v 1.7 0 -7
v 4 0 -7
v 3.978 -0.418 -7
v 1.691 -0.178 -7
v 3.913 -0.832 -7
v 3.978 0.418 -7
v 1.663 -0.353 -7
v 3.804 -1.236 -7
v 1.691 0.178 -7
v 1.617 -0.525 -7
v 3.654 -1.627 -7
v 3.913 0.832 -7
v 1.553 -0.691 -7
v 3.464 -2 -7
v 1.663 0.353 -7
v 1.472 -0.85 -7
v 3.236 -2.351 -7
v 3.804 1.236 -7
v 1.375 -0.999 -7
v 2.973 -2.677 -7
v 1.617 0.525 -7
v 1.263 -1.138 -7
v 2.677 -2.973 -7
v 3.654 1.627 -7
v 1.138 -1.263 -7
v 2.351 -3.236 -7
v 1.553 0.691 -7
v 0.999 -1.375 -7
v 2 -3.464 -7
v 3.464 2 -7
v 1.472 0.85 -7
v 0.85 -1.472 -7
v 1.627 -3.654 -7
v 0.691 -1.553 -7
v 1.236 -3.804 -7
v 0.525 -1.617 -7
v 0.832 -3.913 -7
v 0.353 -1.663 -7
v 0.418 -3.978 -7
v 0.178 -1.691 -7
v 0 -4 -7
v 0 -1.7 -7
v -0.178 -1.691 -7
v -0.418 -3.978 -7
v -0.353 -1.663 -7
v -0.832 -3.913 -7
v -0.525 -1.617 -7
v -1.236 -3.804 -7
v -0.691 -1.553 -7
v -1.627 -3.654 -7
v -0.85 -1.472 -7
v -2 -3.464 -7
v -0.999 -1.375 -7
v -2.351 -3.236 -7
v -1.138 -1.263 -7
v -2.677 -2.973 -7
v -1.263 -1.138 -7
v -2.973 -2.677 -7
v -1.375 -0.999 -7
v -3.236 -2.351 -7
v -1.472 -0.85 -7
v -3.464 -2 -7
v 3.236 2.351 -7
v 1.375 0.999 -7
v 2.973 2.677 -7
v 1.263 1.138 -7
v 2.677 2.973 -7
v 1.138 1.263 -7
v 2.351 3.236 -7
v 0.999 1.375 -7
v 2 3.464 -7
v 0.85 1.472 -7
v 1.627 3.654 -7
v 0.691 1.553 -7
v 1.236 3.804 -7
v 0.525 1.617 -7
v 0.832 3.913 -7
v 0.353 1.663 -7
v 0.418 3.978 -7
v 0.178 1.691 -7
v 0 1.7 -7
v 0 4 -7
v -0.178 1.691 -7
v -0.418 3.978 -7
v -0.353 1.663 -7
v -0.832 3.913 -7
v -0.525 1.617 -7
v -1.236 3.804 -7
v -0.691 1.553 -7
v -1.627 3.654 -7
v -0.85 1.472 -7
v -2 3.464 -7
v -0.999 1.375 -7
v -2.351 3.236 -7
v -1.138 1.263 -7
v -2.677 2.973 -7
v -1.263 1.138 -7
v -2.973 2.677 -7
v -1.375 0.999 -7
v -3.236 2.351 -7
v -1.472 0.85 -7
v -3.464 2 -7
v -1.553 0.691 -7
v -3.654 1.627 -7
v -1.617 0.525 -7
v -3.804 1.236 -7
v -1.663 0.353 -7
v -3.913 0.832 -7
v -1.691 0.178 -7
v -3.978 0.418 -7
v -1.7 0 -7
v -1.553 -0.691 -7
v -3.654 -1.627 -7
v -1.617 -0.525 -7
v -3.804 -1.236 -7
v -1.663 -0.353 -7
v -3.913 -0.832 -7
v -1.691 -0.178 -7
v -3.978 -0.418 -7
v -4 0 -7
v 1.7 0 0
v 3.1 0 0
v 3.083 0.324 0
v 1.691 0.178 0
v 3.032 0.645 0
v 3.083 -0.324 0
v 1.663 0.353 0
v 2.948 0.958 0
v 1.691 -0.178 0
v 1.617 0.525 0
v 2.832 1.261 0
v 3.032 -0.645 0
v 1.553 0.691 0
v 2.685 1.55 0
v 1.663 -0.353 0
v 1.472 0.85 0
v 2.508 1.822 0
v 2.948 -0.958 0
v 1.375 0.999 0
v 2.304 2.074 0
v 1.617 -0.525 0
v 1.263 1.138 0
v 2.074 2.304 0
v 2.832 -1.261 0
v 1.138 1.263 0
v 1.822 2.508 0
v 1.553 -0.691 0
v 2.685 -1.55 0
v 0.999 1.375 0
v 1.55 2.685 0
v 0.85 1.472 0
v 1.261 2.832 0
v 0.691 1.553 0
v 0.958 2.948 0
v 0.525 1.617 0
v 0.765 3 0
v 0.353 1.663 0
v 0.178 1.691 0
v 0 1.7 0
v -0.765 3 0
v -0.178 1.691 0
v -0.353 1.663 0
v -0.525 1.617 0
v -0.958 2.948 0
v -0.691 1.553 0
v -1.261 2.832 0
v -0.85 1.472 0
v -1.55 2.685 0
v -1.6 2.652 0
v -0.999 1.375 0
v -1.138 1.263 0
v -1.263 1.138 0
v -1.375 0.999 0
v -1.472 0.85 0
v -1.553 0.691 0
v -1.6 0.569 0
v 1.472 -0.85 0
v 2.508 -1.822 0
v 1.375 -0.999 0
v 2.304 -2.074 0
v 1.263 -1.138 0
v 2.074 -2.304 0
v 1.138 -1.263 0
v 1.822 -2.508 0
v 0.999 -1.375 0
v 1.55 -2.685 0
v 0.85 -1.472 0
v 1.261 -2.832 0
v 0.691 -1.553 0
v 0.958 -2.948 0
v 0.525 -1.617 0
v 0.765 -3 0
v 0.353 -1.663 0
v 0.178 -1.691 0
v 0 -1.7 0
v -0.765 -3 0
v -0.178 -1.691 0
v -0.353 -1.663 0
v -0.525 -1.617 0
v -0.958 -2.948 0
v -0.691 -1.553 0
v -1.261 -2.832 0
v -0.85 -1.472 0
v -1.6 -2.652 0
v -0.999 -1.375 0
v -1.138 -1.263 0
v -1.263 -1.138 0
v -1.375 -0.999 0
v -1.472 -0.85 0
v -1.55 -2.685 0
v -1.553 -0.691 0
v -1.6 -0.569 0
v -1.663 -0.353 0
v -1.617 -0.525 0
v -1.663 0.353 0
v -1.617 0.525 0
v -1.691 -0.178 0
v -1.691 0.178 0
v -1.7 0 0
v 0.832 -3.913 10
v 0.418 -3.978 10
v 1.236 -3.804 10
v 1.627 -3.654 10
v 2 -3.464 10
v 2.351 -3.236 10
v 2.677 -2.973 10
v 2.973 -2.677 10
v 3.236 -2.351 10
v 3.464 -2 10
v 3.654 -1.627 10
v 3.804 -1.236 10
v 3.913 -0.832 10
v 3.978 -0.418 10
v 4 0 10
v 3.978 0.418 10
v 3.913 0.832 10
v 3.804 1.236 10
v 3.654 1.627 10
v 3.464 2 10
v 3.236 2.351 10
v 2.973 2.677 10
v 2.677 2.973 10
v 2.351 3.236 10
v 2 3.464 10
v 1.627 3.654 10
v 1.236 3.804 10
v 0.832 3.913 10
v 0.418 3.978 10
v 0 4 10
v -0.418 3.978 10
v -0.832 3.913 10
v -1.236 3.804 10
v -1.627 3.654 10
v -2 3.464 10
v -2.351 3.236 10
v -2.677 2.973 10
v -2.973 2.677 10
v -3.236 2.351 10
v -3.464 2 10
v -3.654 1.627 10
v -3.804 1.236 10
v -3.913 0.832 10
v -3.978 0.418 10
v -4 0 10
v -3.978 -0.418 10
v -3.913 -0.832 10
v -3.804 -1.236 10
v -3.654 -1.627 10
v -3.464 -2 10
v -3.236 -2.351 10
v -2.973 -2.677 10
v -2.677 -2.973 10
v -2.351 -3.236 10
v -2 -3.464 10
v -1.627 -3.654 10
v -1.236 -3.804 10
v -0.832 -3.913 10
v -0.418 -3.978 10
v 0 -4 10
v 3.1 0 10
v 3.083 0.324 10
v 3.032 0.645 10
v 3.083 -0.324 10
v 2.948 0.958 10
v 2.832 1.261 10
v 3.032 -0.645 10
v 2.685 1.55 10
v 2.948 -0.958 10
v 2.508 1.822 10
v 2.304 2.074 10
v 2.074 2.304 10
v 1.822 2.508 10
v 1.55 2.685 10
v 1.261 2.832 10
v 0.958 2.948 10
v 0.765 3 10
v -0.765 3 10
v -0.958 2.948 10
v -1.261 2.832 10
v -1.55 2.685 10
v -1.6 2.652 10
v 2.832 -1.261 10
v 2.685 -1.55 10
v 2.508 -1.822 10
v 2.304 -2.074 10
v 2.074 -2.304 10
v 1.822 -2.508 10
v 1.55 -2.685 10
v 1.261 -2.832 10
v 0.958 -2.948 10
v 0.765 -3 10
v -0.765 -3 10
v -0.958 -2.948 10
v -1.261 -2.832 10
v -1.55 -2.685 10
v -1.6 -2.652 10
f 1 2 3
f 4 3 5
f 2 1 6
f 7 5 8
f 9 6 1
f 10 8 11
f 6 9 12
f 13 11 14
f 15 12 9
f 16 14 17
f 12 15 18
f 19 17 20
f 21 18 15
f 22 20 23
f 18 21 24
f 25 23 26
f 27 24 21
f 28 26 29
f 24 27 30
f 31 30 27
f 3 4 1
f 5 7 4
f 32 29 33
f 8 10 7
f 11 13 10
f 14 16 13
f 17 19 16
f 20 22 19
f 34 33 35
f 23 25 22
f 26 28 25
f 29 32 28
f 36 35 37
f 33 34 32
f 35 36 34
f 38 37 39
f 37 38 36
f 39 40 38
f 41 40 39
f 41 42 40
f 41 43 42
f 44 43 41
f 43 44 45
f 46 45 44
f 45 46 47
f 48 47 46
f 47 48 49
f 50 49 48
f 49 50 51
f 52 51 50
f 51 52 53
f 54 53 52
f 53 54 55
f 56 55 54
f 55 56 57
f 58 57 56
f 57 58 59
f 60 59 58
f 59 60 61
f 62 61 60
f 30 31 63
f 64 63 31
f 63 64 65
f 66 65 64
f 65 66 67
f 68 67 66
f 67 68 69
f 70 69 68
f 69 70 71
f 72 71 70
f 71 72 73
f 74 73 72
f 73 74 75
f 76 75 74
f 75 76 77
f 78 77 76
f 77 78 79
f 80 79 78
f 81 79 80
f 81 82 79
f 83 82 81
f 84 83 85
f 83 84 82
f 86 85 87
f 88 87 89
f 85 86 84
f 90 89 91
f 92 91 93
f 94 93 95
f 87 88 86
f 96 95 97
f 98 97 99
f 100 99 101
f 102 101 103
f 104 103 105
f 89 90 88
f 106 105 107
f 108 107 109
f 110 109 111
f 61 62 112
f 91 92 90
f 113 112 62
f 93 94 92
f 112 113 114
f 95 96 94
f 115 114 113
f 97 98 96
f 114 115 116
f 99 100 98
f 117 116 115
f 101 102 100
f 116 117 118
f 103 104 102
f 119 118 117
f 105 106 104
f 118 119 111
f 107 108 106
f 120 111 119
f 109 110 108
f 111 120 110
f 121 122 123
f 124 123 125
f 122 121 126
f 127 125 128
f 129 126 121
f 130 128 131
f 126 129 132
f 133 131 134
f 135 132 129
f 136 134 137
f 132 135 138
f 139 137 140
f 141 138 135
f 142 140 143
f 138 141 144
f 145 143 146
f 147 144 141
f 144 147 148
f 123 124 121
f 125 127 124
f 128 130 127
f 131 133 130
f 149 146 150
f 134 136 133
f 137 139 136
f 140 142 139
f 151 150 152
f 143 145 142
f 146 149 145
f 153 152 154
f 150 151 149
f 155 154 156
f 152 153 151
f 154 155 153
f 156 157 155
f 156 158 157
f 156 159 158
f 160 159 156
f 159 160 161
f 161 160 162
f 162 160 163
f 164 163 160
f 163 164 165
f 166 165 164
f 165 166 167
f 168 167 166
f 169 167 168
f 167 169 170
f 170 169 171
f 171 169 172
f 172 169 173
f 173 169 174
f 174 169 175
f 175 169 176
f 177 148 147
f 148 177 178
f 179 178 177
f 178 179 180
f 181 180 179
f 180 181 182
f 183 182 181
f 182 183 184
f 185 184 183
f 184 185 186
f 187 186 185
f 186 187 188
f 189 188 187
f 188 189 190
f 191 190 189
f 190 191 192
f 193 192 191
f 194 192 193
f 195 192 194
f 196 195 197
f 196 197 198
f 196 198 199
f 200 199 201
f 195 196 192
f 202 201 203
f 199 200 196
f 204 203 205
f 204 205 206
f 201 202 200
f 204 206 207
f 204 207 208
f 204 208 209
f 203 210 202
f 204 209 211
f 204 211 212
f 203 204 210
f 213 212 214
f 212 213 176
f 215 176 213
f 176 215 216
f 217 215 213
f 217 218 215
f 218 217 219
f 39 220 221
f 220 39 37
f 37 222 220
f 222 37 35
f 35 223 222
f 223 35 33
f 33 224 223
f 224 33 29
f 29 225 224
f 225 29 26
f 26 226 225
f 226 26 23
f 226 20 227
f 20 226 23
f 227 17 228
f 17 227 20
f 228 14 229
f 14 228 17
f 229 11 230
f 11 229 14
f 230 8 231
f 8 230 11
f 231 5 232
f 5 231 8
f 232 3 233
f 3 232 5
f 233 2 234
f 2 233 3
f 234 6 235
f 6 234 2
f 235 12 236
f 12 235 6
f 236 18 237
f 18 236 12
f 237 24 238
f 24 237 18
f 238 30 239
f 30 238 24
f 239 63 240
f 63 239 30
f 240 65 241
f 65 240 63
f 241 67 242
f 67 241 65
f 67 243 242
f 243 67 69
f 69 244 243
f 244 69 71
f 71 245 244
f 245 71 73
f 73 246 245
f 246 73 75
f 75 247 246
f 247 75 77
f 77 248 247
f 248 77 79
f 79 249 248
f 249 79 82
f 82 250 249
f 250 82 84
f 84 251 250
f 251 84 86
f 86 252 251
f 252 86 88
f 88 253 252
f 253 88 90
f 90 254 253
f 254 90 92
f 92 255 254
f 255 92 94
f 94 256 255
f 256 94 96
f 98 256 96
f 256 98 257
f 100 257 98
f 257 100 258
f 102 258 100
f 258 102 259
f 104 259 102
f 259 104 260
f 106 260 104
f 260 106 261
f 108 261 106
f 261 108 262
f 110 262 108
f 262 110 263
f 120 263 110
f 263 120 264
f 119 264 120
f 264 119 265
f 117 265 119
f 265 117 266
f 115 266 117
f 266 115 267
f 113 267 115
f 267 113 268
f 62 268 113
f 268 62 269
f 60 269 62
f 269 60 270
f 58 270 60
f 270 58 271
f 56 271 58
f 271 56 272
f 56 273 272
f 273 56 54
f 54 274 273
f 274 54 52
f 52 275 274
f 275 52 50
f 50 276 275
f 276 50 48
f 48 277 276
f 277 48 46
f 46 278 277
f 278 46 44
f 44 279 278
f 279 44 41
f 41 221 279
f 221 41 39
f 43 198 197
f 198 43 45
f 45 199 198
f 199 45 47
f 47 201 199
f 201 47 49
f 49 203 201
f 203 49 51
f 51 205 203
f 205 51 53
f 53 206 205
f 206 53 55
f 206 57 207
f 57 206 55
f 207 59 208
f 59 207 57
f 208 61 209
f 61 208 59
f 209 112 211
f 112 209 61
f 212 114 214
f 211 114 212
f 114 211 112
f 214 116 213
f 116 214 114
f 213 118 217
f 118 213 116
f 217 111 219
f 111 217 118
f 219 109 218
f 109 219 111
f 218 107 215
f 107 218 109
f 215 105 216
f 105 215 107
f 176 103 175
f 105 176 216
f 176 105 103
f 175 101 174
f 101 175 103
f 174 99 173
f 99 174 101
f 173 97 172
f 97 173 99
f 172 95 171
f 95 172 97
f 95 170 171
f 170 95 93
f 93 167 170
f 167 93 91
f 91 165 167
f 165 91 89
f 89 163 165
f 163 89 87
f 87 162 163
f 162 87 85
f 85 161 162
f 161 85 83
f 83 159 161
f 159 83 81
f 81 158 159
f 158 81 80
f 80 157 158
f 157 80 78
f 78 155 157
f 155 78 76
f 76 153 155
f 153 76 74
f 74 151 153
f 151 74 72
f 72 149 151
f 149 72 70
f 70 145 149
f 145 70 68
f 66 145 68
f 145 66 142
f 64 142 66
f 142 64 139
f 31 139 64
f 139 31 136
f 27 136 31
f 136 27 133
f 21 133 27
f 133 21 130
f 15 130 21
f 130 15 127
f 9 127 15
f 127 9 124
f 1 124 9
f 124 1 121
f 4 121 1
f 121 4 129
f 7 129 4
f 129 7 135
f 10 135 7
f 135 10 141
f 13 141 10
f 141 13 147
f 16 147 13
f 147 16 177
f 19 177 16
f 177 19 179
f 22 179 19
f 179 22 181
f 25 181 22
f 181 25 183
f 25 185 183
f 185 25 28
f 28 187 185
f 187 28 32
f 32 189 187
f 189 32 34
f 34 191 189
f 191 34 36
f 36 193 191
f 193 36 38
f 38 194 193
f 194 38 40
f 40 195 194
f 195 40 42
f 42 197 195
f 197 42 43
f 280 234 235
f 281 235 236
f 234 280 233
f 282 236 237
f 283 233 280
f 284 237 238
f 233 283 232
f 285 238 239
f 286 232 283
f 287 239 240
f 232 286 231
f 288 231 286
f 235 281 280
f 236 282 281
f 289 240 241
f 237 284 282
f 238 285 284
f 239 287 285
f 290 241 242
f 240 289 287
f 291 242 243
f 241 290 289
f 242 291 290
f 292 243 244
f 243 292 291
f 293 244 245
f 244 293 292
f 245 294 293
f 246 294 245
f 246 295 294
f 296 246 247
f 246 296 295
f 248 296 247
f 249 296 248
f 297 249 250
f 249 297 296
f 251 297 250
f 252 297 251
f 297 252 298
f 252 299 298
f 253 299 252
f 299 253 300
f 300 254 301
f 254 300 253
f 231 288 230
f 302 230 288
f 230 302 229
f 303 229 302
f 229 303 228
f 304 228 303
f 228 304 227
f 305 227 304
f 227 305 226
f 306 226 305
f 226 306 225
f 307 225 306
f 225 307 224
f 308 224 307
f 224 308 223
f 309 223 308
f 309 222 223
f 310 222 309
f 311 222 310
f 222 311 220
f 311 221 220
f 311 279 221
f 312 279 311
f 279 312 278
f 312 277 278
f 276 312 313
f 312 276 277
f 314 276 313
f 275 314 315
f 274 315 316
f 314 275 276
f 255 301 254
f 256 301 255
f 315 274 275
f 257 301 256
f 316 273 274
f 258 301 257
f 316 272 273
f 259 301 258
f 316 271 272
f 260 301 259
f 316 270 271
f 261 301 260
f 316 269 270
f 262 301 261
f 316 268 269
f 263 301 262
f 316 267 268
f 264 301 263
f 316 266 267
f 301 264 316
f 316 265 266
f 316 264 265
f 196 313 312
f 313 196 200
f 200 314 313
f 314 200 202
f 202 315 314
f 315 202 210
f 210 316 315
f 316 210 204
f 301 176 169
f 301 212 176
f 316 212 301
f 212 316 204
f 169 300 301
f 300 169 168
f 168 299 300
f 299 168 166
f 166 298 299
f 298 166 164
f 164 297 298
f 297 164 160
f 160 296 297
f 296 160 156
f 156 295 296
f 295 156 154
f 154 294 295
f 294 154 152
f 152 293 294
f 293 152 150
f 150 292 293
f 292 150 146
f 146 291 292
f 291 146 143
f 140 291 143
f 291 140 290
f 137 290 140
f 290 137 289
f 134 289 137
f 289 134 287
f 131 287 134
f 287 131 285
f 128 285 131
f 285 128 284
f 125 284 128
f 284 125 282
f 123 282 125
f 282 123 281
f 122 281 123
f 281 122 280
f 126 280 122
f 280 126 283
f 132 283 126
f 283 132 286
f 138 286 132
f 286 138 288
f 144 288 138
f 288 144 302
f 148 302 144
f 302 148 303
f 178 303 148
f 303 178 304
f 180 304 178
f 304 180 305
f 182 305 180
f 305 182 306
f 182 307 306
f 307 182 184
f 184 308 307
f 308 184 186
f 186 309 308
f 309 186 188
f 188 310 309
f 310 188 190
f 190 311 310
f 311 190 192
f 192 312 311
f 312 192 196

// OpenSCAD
$fn=60;

translate([0,0,-7])
linear_extrude(7)
difference(){
    circle(4);
    circle(1.5 + 0.2);
}

linear_extrude(10)

difference(){
    circle(4);
    intersection(){
        circle(3 + 0.1);
        translate([1.5 - 0.1,0,0]) square(6, center=true);
    }
}
